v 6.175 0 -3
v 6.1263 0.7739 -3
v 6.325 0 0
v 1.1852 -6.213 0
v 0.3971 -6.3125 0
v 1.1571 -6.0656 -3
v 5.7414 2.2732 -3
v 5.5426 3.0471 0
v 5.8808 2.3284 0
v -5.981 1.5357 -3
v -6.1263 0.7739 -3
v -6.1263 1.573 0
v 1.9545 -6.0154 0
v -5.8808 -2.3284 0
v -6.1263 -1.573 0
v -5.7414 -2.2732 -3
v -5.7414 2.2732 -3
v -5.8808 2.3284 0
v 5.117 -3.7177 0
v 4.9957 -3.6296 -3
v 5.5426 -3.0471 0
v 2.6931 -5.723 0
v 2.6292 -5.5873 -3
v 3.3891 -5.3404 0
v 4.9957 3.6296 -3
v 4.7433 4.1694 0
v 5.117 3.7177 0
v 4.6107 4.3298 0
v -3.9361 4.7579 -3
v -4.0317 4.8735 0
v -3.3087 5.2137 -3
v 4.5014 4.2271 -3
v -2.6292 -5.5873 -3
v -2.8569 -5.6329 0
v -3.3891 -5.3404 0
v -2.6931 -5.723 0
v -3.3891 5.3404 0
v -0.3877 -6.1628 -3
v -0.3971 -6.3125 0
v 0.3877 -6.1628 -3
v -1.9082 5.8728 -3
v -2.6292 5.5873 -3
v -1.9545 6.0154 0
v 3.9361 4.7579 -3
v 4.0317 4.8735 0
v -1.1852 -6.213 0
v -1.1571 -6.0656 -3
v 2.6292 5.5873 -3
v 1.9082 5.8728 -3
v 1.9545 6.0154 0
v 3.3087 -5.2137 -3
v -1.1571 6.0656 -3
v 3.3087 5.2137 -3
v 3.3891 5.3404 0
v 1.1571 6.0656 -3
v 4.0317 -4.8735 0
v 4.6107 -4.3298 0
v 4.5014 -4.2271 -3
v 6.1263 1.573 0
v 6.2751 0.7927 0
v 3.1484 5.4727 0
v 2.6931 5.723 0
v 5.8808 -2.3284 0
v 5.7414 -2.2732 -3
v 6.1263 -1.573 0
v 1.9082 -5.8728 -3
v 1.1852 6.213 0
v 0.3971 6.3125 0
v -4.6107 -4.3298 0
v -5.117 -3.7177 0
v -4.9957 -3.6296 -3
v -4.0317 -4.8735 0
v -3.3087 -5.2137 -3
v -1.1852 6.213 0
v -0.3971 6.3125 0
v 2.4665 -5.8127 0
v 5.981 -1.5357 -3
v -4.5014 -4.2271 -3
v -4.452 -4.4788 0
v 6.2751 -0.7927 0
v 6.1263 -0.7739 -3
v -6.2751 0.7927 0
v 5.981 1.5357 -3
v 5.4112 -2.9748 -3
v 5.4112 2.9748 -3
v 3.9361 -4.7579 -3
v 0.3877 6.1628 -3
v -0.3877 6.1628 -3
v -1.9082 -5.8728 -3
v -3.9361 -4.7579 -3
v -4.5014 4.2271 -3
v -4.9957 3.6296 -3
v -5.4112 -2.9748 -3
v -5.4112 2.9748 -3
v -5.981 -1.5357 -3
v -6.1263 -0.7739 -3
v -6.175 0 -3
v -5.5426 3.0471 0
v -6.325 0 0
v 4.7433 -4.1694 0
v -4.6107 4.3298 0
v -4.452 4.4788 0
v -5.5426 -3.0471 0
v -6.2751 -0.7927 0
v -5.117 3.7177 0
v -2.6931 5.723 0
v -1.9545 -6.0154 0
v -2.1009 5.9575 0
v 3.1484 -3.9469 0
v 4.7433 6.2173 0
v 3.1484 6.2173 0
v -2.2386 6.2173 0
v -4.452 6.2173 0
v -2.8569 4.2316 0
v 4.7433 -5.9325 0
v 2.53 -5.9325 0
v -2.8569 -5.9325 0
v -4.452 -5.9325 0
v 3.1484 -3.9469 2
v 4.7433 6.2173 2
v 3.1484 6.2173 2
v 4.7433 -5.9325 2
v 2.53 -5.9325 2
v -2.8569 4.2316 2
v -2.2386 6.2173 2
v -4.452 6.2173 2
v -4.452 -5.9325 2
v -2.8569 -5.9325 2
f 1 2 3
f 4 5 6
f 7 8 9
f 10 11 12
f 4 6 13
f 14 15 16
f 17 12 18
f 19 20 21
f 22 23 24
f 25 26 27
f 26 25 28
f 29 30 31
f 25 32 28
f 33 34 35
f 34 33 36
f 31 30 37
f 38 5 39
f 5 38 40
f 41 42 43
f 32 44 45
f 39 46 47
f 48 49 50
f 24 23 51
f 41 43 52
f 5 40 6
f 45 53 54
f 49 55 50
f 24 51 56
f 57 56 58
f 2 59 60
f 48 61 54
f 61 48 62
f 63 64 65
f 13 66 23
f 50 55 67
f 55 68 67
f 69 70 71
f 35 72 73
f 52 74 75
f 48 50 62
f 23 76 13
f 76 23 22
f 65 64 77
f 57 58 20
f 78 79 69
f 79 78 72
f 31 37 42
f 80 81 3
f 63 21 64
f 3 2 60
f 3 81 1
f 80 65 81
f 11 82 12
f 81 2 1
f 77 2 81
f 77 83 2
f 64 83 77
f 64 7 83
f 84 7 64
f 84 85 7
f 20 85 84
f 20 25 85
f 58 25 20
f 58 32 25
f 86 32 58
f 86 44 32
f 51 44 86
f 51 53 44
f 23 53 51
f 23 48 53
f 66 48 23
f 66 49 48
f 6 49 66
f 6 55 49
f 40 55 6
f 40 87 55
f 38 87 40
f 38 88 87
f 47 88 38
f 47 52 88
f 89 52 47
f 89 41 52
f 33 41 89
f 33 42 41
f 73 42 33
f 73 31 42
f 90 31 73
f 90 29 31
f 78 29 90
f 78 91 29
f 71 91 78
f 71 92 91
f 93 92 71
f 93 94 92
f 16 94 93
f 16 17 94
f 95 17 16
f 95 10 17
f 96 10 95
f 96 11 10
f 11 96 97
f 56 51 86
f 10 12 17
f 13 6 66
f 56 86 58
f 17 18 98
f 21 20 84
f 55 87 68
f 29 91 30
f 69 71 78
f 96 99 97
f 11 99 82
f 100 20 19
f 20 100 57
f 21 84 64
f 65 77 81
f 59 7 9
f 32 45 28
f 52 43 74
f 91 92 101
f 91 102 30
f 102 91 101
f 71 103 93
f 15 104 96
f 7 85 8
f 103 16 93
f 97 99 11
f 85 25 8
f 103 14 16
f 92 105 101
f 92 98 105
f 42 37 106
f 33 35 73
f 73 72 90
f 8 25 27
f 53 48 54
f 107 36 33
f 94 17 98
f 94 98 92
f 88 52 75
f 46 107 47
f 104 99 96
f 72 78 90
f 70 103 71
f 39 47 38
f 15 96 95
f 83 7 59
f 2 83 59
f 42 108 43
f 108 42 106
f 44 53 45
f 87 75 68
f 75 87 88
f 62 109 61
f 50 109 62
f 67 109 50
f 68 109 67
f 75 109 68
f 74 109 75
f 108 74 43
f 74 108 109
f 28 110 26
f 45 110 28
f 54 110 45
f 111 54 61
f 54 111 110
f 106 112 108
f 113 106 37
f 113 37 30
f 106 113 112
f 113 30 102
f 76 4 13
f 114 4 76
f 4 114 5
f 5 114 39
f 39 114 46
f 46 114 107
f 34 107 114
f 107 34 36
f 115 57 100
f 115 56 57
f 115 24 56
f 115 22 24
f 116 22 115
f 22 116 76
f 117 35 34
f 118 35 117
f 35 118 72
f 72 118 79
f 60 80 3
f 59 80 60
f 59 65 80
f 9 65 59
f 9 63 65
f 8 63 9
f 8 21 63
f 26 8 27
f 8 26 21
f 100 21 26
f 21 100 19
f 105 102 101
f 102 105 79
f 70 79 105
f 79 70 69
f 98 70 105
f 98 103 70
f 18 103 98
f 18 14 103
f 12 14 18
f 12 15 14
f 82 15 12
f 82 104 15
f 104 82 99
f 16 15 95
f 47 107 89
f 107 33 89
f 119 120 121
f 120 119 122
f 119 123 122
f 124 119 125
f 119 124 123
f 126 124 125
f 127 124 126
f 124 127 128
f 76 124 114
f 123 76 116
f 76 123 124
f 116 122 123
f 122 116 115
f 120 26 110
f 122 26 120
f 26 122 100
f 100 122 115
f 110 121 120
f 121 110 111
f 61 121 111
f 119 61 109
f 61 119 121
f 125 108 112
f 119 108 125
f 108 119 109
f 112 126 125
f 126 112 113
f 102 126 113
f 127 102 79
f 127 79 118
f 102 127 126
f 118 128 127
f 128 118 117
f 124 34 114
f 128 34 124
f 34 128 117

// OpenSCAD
$fn = 50;


difference() {
	union() {
		translate(v = [0, 0, -3.0000000000]) {
			cylinder(h = 3, r1 = 6.1750000000, r2 = 6.3250000000);
		}
		linear_extrude(height = 2) {
			text(font = "Impact", halign = "center", size = 12, text = "N", valign = "center");
		}
	}
	union();
}
